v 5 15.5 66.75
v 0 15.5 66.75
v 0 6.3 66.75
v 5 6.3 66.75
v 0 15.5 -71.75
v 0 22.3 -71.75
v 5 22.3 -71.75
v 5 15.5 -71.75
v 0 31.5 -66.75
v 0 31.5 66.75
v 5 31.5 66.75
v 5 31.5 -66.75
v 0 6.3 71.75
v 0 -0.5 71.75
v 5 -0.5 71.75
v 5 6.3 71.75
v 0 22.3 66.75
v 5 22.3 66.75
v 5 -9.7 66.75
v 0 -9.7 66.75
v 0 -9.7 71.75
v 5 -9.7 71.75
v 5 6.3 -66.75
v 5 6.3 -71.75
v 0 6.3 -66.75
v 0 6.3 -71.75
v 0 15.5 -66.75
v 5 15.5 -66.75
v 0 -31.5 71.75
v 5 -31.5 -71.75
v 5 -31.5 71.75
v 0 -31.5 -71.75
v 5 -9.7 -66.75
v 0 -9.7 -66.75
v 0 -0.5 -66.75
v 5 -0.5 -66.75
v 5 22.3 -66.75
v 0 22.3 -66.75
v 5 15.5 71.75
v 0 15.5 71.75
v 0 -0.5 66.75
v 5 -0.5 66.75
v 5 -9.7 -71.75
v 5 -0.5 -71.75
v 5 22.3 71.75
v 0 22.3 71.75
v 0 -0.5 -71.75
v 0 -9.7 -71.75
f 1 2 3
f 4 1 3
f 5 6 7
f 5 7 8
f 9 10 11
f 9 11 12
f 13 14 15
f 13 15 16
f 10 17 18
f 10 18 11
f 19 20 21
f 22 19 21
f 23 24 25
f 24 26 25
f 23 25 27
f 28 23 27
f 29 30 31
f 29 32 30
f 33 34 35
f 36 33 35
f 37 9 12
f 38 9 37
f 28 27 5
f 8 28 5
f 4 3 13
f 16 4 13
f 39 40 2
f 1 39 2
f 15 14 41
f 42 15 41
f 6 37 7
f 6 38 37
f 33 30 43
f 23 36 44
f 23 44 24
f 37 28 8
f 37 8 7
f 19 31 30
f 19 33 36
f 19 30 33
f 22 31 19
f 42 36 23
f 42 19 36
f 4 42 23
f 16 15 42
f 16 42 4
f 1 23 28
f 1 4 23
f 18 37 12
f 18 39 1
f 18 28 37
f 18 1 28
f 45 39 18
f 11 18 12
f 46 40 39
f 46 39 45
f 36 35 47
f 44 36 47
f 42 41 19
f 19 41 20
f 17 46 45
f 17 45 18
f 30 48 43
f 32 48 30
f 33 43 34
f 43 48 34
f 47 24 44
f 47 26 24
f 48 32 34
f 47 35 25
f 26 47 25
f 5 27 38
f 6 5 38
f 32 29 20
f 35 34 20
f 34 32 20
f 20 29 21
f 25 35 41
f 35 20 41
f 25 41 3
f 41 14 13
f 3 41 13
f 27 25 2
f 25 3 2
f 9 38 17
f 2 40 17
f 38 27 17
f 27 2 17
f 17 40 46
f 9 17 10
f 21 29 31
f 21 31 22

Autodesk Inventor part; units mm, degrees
ref_plane "YZ Plane" through (0, 0, 0) normal (1, 0, 0) x (0, 1, 0)
ref_plane "XZ Plane" through (0, 0, 0) normal (0, 1, 0) x (-1, 0, 0)
ref_plane "XY Plane" through (0, 0, 0) normal (0, 0, 1) x (1, 0, 0)
sketch "Sketch1" plane through (0, 0, 0) normal (1, 0, 0) x (0, 1, 0)
  line L0 (-31.5, 71.75) -> (31.5, 71.75)
  line L1 (31.5, 71.75) -> (31.5, -71.75)
  line L2 (31.5, -71.75) -> (-31.5, -71.75)
  line L3 (-31.5, -71.75) -> (-31.5, 71.75)
  line L4 (-31.5, 71.75) -> (31.5, -71.75) construction
  line L5 (31.5, 71.75) -> (-31.5, -71.75) construction
  line L6 (12.4, 71.75) -> (24.4, 71.75)
  line L7 (6.3, 71.75) -> (15.5, 71.75)
  line L8 (15.5, 71.75) -> (15.5, 66.75)
  line L9 (15.5, 66.75) -> (6.3, 66.75)
  line L10 (6.3, 66.75) -> (6.3, 71.75)
  line L11 (6.3, 71.75) -> (15.5, 66.75) construction
  line L12 (15.5, 71.75) -> (6.3, 66.75) construction
  line L13 (22.3, 66.75) -> (31.5, 66.75)
  line L14 (31.5, 66.75) -> (31.5, 71.75)
  line L15 (31.5, 71.75) -> (22.3, 71.75)
  line L16 (22.3, 71.75) -> (22.3, 66.75)
  line L17 (22.3, 66.75) -> (31.5, 71.75) construction
  line L18 (31.5, 66.75) -> (22.3, 71.75) construction
  line L19 (-9.7, 71.75) -> (-0.5, 71.75)
  line L20 (-0.5, 71.75) -> (-0.5, 66.75)
  line L21 (-0.5, 66.75) -> (-9.7, 66.75)
  line L22 (-9.7, 66.75) -> (-9.7, 71.75)
  line L23 (-9.7, 71.75) -> (-0.5, 66.75) construction
  line L24 (-0.5, 71.75) -> (-9.7, 66.75) construction
  point P0 (0, 0)
  point P1 (10.9, 69.25)
  point P2 (26.9, 69.25)
  point P3 (31.5, 69.25)
  point P4 (22.3, 71.75)
  point P5 (-5.1, 69.25)
  point P6 (-0.5, 71.75)
  dimension "d0" = 143.5
  dimension "d1" = 63
  dimension "d19" = 5
  dimension "d20" = 9.2
  dimension "d21" = 9.2
  dimension "d22" = 5
  dimension "d23" = 16
  dimension "d26" = 6.8
  dimension "d27" = 16
  dimension "d28" = 9.2
extrude "Extrusion1" add sketch "Sketch1" along normal blind 5
extrude "Extrusion3" cut sketch "Sketch1" along normal through all contours L0 L20 L21 L22 | L0 L8 L9 L10 | L13 L16 L0 L1
mirror "Mirror1" about plane through (0, 0, 0) normal (0, 0, 1) of "Extrusion3"
equation "\"d21\" = d20"
equation "\"d22\" = d19"
equation "\"d27\" = d23"
equation "\"d28\" = d21"
properties part number "gate"
